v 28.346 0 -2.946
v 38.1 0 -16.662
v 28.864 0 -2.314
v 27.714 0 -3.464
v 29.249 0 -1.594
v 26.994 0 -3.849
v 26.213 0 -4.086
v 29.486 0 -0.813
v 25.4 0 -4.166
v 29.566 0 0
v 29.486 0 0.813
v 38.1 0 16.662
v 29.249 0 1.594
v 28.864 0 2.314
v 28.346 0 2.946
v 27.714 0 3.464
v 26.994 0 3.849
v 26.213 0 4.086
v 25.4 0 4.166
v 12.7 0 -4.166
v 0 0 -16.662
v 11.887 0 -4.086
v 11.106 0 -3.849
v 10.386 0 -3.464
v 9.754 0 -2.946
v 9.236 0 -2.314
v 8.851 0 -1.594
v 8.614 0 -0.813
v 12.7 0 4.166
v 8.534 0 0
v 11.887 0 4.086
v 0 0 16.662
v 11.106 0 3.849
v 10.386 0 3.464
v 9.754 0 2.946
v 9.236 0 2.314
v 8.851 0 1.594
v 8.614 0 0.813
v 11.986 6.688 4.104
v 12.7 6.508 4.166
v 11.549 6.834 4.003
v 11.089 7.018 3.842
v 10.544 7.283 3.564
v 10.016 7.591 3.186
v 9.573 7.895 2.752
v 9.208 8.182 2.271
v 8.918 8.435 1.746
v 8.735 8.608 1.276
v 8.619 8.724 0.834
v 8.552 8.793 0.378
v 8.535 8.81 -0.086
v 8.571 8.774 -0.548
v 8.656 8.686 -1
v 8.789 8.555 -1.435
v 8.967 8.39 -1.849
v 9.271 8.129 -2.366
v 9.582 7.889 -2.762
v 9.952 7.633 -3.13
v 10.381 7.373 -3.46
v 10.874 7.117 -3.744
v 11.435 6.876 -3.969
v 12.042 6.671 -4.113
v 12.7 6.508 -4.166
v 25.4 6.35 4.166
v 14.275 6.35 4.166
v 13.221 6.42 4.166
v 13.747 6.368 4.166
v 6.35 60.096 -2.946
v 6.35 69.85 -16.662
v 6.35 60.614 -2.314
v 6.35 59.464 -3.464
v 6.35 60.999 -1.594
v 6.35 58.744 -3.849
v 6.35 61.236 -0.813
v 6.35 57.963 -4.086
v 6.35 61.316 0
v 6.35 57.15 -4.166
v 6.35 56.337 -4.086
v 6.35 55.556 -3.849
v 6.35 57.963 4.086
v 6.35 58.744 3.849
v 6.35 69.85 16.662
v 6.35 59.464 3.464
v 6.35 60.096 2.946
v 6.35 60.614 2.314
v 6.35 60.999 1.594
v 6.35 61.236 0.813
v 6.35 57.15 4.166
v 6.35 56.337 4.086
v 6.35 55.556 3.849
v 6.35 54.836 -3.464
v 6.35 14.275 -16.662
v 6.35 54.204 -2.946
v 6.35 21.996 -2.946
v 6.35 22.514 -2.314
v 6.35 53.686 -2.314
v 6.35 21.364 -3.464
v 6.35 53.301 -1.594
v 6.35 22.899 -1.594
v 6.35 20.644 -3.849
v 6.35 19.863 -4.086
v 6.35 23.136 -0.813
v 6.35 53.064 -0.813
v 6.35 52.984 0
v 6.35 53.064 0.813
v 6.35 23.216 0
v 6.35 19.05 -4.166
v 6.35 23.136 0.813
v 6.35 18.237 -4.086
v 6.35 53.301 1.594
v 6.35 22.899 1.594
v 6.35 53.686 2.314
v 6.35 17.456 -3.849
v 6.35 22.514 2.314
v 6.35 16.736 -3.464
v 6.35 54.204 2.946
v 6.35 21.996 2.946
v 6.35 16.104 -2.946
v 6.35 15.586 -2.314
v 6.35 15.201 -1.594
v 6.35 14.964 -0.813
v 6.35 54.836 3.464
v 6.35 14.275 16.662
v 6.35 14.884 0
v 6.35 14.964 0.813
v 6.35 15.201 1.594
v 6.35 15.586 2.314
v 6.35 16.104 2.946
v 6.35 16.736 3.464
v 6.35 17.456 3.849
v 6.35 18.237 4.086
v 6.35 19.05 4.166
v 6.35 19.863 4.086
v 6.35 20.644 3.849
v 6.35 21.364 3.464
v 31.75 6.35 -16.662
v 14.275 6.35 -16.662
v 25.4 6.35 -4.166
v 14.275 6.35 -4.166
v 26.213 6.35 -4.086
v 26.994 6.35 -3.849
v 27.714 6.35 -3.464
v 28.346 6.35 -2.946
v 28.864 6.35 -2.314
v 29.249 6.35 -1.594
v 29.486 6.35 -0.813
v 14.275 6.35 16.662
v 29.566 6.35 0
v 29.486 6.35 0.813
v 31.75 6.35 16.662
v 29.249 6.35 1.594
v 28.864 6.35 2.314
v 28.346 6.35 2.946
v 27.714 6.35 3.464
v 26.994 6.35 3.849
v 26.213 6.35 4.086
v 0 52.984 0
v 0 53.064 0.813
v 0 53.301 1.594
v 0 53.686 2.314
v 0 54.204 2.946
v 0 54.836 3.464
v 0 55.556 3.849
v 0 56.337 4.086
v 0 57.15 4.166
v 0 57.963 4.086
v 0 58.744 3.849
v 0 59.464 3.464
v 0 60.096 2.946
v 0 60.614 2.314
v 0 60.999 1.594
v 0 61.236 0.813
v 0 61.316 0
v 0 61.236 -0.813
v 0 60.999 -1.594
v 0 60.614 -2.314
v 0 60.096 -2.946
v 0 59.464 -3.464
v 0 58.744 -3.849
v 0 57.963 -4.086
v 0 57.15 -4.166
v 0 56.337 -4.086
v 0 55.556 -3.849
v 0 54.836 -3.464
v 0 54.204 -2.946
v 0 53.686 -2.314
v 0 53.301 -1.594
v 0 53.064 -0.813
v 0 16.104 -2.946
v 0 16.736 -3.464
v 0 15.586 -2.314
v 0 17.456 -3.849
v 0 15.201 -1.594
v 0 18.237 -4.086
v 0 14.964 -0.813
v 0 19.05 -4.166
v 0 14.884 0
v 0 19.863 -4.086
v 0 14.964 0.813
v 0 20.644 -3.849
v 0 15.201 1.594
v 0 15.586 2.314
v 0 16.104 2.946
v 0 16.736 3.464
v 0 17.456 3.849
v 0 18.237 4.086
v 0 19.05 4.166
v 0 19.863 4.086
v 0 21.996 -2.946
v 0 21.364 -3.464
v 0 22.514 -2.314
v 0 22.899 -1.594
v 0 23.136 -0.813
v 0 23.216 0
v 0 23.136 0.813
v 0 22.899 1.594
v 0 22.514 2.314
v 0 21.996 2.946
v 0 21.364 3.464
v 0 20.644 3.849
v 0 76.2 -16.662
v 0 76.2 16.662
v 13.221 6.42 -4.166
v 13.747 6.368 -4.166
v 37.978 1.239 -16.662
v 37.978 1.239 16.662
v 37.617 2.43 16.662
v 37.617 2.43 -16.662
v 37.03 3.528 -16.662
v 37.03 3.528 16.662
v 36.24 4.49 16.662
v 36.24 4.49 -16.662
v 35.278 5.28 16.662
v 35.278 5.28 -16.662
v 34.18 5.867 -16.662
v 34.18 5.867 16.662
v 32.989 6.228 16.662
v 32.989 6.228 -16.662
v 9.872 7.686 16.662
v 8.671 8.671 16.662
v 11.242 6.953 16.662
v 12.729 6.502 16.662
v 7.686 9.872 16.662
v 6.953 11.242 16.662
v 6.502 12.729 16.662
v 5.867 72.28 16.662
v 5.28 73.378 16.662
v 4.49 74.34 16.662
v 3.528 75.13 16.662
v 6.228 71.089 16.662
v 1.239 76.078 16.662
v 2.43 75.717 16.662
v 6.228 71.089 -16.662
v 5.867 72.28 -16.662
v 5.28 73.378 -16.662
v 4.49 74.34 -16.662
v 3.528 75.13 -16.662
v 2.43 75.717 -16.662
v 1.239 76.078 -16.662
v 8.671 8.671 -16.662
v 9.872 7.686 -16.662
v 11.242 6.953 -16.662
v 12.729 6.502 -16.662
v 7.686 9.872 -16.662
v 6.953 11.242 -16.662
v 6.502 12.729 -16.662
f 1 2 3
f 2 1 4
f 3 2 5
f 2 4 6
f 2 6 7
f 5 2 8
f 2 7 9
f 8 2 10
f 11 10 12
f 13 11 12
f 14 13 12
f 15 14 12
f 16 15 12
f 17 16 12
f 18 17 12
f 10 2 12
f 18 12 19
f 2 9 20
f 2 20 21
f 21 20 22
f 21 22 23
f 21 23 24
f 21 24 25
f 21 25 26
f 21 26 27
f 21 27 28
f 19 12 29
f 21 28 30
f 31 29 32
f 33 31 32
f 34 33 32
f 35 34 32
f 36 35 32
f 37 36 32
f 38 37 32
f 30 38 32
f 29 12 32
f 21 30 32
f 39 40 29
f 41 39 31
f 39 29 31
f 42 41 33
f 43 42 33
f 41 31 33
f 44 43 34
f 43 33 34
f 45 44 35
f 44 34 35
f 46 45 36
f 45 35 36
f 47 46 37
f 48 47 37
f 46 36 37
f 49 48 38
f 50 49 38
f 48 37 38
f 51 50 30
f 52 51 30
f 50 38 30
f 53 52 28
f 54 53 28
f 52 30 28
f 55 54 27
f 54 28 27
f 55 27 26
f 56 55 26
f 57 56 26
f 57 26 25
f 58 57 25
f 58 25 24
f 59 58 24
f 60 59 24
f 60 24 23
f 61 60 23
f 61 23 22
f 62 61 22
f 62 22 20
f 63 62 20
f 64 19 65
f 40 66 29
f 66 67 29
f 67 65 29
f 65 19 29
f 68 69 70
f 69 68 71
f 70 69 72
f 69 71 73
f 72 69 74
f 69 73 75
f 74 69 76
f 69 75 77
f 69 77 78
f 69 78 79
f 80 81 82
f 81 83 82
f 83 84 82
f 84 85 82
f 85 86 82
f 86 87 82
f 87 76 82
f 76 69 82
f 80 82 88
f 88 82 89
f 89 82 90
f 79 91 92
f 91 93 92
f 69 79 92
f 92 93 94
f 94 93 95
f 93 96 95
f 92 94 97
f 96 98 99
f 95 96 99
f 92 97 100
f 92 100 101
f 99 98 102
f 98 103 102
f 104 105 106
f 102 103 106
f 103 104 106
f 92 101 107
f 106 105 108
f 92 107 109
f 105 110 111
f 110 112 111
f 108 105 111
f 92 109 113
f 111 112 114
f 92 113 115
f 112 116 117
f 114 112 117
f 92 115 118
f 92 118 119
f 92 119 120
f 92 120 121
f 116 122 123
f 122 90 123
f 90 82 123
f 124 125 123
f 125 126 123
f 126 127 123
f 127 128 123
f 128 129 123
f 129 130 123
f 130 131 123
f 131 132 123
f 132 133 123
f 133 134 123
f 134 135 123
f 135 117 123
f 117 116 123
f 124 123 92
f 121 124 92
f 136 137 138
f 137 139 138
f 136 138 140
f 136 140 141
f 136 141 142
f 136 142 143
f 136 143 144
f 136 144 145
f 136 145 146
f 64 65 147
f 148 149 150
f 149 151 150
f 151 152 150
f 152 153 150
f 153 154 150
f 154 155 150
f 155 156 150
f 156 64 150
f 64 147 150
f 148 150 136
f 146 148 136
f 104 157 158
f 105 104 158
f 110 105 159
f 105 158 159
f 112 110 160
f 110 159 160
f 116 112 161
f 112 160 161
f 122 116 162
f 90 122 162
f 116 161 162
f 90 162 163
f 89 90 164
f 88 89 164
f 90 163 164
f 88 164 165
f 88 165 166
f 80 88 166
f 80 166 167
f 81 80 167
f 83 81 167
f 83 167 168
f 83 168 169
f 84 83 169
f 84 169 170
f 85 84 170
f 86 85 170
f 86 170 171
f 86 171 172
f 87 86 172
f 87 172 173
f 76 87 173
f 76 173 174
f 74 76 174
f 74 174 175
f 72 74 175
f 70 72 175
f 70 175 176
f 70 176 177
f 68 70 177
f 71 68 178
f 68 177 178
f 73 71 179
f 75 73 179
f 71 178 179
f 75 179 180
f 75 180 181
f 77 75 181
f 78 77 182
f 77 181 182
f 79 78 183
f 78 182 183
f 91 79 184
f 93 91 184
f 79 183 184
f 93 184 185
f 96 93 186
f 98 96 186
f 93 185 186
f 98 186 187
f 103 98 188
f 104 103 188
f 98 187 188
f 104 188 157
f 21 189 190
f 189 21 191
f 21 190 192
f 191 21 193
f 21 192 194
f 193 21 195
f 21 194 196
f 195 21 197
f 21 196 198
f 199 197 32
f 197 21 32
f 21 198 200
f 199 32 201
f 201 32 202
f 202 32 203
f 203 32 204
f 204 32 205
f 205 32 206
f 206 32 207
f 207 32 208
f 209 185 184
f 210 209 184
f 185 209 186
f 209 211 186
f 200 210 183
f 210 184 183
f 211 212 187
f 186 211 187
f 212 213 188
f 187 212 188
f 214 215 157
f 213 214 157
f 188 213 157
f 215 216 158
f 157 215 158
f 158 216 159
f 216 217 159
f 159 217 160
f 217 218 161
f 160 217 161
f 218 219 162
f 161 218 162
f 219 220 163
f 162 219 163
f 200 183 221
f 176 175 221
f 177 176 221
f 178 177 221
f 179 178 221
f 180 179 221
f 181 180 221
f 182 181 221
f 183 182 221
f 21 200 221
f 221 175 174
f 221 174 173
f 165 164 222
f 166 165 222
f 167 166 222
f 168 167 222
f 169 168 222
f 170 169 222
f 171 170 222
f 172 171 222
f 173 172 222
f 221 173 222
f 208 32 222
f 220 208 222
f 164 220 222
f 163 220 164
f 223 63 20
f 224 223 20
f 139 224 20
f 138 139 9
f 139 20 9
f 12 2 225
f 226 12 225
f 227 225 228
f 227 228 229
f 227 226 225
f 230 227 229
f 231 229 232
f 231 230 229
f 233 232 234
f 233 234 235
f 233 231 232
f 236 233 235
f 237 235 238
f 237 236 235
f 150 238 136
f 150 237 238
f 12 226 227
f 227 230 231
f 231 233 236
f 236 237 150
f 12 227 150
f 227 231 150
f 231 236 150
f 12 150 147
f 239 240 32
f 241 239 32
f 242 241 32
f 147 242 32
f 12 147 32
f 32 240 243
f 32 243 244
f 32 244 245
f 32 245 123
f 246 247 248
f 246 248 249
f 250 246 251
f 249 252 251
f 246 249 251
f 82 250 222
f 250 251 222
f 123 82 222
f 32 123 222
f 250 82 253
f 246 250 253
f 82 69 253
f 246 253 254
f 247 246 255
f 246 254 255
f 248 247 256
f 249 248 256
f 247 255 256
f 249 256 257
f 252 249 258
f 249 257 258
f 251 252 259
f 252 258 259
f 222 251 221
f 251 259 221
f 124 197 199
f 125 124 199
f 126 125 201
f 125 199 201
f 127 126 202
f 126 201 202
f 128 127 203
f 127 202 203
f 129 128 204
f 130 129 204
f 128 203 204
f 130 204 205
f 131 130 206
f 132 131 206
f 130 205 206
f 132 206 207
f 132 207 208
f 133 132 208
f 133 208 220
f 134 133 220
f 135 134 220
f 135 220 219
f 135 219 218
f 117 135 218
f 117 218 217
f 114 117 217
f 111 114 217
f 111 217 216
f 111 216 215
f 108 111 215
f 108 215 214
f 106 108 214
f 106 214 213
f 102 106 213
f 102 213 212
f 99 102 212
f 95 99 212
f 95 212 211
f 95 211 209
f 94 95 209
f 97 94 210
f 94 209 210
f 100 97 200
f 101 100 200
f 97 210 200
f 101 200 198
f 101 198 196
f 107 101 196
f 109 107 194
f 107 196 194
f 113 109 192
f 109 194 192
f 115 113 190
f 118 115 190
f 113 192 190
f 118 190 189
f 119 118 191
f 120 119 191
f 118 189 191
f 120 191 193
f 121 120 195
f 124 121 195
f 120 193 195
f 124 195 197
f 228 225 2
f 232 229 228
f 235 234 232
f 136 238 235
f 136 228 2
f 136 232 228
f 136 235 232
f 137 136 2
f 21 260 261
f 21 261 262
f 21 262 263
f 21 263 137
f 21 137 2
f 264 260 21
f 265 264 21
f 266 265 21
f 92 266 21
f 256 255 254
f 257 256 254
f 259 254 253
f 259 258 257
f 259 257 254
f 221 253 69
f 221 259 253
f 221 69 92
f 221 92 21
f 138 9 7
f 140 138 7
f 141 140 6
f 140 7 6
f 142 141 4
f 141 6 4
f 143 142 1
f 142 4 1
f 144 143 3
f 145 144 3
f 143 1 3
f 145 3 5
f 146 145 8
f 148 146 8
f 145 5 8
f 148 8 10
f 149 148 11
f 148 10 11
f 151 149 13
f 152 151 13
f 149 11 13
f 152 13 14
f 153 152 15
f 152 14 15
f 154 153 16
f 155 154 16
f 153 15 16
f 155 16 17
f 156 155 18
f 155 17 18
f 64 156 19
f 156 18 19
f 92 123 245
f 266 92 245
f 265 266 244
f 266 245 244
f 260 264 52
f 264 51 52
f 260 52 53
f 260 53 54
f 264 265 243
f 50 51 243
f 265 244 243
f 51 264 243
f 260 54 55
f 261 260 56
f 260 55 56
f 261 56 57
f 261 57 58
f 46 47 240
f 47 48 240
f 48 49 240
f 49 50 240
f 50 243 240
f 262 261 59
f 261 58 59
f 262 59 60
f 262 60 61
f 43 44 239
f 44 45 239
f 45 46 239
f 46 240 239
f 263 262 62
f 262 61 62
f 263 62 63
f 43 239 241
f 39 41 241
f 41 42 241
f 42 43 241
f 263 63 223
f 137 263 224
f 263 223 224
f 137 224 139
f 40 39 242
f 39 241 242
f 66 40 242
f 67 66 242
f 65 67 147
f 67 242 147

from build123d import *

# Parameters (mm, degrees)
BOSS_EXTRUDE1_DEPTH = 16.6624
FILLET1_R           = 6.35
CUT_EXTRUDE1_REACH  = 88.808
SKETCH3_R           = 4.1656
CUT_EXTRUDE2_REACH  = 88.808


with BuildPart() as part:
    # Sketch2 → Boss-Extrude1 (new, symmetric)
    with BuildSketch(Plane.XY):
        with BuildLine():
            Line((0, 0), (0, 76.2))
            Line((0, 76.2), (6.35, 76.2))
            Line((6.35, 76.2), (6.35, 14.2748))
            ThreePointArc((6.35, 14.2748), (8.67112018, 8.67112018), (14.2748, 6.35))
            Line((14.2748, 6.35), (38.1, 6.35))
            Line((38.1, 6.35), (38.1, 0))
            Line((38.1, 0), (0, 0))
        make_face()
    extrude(amount=BOSS_EXTRUDE1_DEPTH, both=True)

    # Fillet1
    fillet1_edges = [part.edges().sort_by_distance(p)[0] for p in [
        (38.1, 6.35, 0),
        (6.35, 76.2, 0),
    ]]
    fillet(fillet1_edges, radius=FILLET1_R - 0.0001)  # a hair under: the kernel refuses the full size

    # Sketch3 → Cut-Extrude1 (cut, up to next)
    with BuildSketch(Plane.ZY, mode=Mode.PRIVATE) as cut_extrude1_sk1:
        with Locations(Location((0, 57.15, 0), (0, 0, 270))):
            Circle(SKETCH3_R)
    cut_extrude1_tool1 = extrude(cut_extrude1_sk1.sketch, amount=-CUT_EXTRUDE1_REACH, mode=Mode.PRIVATE) & part.part
    # Sketch3 → Cut-Extrude1 (cut, up to next)
    with BuildSketch(Plane.ZY, mode=Mode.PRIVATE) as cut_extrude1_sk2:
        with Locations(Location((0, 19.05, 0), (0, 0, 270))):
            Circle(SKETCH3_R)
    cut_extrude1_tool2 = extrude(cut_extrude1_sk2.sketch, amount=-CUT_EXTRUDE1_REACH, mode=Mode.PRIVATE) & part.part
    add(cut_extrude1_tool1.solids().sort_by_distance((0, 57.15, 0))[0], mode=Mode.SUBTRACT)
    add(cut_extrude1_tool2.solids().sort_by_distance((0, 19.05, 0))[0], mode=Mode.SUBTRACT)

    # Sketch4 → Cut-Extrude2 (cut, up to next)
    with BuildSketch(Plane.XZ, mode=Mode.PRIVATE) as cut_extrude2_sk1:
        with BuildLine():
            Line((25.4, 4.1656), (12.7, 4.1656))
            ThreePointArc((12.7, 4.1656), (8.5344, 0), (12.7, -4.1656))
            Line((12.7, -4.1656), (25.4, -4.1656))
            ThreePointArc((25.4, -4.1656), (29.5656, 0), (25.4, 4.1656))
        make_face()
    cut_extrude2_tool1 = extrude(cut_extrude2_sk1.sketch, amount=-CUT_EXTRUDE2_REACH, mode=Mode.PRIVATE) & part.part
    add(cut_extrude2_tool1.solids().sort_by_distance((19.05, 0, 0))[0], mode=Mode.SUBTRACT)


solid = part.part
